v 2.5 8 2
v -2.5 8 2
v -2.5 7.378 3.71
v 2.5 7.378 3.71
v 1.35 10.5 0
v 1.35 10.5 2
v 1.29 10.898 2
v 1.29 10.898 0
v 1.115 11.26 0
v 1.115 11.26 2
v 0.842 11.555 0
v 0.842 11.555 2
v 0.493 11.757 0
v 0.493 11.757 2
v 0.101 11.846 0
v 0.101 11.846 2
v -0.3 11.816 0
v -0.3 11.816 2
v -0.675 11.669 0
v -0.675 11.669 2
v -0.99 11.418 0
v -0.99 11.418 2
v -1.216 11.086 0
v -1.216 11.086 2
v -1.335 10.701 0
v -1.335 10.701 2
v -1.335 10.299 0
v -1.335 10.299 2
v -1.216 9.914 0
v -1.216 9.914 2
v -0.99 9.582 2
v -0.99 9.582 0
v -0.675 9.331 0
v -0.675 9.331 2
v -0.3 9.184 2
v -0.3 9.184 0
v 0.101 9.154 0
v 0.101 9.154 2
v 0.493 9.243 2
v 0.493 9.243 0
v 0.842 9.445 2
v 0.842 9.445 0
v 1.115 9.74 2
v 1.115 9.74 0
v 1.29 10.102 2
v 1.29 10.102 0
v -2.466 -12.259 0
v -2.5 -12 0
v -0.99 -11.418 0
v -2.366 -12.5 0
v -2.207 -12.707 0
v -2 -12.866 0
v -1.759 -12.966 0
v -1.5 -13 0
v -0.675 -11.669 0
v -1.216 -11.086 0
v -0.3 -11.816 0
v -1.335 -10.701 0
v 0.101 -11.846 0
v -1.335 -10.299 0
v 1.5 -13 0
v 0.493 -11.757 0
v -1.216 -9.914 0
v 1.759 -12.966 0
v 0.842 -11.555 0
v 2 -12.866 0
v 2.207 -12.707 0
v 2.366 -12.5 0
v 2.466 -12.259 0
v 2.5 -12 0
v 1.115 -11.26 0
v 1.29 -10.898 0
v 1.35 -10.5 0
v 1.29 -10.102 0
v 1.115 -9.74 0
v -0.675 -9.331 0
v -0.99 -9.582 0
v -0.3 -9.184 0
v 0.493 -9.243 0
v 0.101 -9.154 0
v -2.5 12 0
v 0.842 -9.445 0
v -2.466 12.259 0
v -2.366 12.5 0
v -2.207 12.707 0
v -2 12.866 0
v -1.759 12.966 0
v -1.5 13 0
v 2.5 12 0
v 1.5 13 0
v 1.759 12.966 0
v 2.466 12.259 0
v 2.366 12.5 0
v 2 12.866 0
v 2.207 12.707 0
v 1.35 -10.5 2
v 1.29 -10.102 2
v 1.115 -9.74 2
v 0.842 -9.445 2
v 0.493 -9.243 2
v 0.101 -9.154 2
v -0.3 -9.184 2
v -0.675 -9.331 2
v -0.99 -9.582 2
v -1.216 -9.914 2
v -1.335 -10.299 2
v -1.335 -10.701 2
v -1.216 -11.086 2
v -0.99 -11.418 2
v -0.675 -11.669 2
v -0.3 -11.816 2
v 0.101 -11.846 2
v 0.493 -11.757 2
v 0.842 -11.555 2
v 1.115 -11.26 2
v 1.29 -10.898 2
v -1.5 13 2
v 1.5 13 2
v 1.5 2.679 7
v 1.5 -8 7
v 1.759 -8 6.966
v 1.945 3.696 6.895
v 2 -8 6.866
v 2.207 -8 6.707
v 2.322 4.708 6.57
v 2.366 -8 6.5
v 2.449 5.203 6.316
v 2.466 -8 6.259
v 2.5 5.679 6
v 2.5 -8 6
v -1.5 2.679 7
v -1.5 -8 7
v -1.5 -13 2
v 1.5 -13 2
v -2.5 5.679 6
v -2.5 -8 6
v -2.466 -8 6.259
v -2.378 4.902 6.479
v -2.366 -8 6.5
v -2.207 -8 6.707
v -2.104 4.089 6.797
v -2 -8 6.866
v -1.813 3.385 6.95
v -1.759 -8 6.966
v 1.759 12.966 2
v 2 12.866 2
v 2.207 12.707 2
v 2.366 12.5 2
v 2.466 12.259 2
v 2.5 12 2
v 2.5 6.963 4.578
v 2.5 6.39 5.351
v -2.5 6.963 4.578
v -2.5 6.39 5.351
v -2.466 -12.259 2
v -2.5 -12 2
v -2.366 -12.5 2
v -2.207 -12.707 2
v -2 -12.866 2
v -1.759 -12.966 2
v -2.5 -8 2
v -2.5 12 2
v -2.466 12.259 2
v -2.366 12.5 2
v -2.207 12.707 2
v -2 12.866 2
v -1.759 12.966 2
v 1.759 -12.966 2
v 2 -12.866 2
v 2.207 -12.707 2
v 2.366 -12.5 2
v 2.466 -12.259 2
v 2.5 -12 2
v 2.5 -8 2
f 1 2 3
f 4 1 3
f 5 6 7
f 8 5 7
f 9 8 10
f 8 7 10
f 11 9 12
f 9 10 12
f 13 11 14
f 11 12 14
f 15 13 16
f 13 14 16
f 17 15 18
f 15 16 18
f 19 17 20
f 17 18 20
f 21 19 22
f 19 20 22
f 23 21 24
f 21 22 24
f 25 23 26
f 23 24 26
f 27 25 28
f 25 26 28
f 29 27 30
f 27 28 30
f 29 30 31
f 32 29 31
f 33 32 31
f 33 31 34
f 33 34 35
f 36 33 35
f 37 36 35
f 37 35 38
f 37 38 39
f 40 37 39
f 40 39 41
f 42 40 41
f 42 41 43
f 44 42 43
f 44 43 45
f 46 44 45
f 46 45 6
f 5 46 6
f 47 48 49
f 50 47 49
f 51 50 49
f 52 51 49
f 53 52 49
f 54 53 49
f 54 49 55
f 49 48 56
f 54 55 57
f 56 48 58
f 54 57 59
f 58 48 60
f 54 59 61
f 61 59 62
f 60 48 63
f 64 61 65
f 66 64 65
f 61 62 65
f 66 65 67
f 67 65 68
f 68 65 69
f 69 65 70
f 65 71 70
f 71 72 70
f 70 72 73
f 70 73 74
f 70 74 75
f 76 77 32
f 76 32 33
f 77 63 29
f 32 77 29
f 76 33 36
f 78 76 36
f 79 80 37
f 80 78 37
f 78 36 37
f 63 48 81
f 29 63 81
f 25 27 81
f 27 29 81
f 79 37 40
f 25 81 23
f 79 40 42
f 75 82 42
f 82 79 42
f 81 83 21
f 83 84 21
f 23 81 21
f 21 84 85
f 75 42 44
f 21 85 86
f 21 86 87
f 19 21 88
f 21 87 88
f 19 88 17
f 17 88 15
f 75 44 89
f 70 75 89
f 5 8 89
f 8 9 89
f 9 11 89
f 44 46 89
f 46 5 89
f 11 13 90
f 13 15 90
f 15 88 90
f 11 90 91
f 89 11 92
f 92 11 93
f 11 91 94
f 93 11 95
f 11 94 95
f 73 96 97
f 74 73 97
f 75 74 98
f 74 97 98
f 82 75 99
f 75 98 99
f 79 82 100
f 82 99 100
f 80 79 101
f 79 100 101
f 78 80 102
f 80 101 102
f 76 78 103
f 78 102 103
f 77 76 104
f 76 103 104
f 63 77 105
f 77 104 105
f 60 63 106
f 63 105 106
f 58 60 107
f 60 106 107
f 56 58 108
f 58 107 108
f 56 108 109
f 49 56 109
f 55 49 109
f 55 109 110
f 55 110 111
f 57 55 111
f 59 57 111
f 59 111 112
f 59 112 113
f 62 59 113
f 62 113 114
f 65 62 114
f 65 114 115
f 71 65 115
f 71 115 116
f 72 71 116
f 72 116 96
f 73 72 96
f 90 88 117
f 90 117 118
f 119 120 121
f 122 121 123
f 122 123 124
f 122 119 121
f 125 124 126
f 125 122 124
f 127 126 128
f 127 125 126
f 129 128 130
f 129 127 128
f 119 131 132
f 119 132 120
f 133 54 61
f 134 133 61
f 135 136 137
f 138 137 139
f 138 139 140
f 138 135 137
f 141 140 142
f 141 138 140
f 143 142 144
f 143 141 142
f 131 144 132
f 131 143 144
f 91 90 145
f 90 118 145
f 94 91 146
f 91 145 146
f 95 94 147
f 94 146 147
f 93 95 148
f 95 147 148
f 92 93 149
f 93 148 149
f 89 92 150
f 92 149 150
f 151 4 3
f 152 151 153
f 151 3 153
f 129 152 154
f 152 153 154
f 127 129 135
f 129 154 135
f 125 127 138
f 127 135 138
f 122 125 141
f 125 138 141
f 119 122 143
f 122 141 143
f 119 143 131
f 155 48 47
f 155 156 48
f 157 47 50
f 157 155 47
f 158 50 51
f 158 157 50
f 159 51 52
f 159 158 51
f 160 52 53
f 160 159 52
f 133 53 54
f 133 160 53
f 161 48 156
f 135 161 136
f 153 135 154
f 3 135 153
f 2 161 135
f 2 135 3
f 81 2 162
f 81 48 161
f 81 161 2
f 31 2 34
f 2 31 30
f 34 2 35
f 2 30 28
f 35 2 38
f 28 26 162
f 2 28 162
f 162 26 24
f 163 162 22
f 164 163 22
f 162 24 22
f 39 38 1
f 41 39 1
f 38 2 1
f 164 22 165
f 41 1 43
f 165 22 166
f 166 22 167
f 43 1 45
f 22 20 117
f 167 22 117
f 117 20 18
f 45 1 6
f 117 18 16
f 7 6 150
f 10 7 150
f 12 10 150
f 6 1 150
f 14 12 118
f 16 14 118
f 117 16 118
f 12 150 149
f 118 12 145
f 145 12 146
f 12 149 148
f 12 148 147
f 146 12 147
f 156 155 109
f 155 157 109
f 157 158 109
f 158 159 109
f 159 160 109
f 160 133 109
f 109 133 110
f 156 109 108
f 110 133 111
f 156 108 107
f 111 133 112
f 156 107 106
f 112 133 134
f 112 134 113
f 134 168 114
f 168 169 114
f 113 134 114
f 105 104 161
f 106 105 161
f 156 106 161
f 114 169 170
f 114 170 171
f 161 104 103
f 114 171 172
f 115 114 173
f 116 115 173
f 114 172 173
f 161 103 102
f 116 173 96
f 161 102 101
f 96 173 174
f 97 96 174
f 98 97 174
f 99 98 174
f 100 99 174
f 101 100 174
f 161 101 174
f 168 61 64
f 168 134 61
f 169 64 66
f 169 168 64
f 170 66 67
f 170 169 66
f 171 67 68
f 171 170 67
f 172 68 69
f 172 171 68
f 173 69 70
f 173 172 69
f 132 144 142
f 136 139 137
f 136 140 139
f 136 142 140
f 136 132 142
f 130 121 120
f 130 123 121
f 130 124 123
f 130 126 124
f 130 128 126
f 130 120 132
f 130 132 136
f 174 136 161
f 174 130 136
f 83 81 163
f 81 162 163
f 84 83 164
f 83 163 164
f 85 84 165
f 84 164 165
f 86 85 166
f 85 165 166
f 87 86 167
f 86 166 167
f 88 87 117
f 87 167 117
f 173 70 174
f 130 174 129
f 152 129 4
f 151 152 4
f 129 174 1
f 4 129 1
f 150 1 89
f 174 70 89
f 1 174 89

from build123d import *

# Parameters (mm, degrees)
SKETCH1_W                  = 5
SKETCH1_H                  = 26
EXTRUDE1_DEPTH             = 7
F_2_7_2_7_DIAMETER_HOLE1_D = 2.7
EXTRUDE3_REACH             = 17.588
SKETCH8_W                  = 5
SKETCH8_H                  = 5
FILLET1_R                  = 1
FILLET2_R                  = 1
EXTRUDE4_REACH             = 17.588


with BuildPart() as part:
    # Sketch1 → Extrude1 (new body)
    with BuildSketch(Plane.XY):
        Rectangle(SKETCH1_W, SKETCH1_H)
    extrude(amount=EXTRUDE1_DEPTH)

    # Ø2.7 (2.7) Diameter Hole1 (through all)
    with Locations(Plane(origin=(0, 0, 0), x_dir=(-1, 0, 0), z_dir=(0, 0, -1))):
        with Locations((0, 10.5), (0, -10.5)):
            Hole(F_2_7_2_7_DIAMETER_HOLE1_D / 2)

    # Extrude3: up to this face of the body (flat: up to its plane)
    extrude3_end = Plane(part.part.faces().sort_by_distance((-2.5, 0, 3.5))[0])
    # Sketch8 → Extrude3 (cut, up to the picked face)
    with BuildSketch(Plane(origin=(2.5, 0, 0), x_dir=(0, 0, -1), z_dir=(1, 0, 0)), mode=Mode.PRIVATE) as extrude3_sk1:
        with Locations((-4.5, -10.5)):
            Rectangle(SKETCH8_W, SKETCH8_H)
    extrude3_tool1 = split(extrude(extrude3_sk1.sketch, amount=-EXTRUDE3_REACH, mode=Mode.PRIVATE), bisect_by=extrude3_end, keep=Keep.BOTH, mode=Mode.PRIVATE)
    # Sketch8 → Extrude3 (cut, up to the picked face)
    with BuildSketch(Plane(origin=(2.5, 0, 0), x_dir=(0, 0, -1), z_dir=(1, 0, 0)), mode=Mode.PRIVATE) as extrude3_sk2:
        with Locations((-4.5, 10.5)):
            Rectangle(SKETCH8_W, SKETCH8_H)
    extrude3_tool2 = split(extrude(extrude3_sk2.sketch, amount=-EXTRUDE3_REACH, mode=Mode.PRIVATE), bisect_by=extrude3_end, keep=Keep.BOTH, mode=Mode.PRIVATE)
    add(extrude3_tool1.solids().sort_by(Axis((2.5, -10.5, 4.5), (-1, 0, 0)))[0], mode=Mode.SUBTRACT)
    add(extrude3_tool2.solids().sort_by(Axis((2.5, 10.5, 4.5), (-1, 0, 0)))[0], mode=Mode.SUBTRACT)

    # Fillet1
    fillet1_edges = [part.edges().sort_by_distance(p)[0] for p in [
        (2.5, 0, 7),
        (-2.5, 0, 7),
    ]]
    fillet(fillet1_edges, radius=FILLET1_R)

    # Fillet2
    fillet2_edges = [part.edges().sort_by_distance(p)[0] for p in [
        (2.5, -13, 1),
        (-2.5, -13, 1),
        (-2.5, 13, 1),
        (2.5, 13, 1),
    ]]
    fillet(fillet2_edges, radius=FILLET2_R)

    # Extrude4: up to this face of the body (flat: up to its plane)
    extrude4_end = Plane(part.part.faces().sort_by_distance((2.5, 0, 2.714285714))[0])
    # Sketch9 → Extrude4 (cut, up to the picked face)
    with BuildSketch(Plane.ZY.offset(2.5), mode=Mode.PRIVATE) as extrude4_sk1:
        with BuildLine():
            Line((2, 8), (3.710100717, 7.377574242))
            ThreePointArc((3.710100717, 7.377574242), (6.095760221, 5.546993319), (7, 2.679111138))
            Line((7, 2.679111138), (7, 8))
            Line((7, 8), (2, 8))
        make_face()
    extrude4_tool1 = split(extrude(extrude4_sk1.sketch, amount=-EXTRUDE4_REACH, mode=Mode.PRIVATE), bisect_by=extrude4_end, keep=Keep.BOTH, mode=Mode.PRIVATE)
    add(extrude4_tool1.solids().sort_by(Axis((-2.5, 6.831886, 5.650764), (1, 0, 0)))[0], mode=Mode.SUBTRACT)


solid = part.part
